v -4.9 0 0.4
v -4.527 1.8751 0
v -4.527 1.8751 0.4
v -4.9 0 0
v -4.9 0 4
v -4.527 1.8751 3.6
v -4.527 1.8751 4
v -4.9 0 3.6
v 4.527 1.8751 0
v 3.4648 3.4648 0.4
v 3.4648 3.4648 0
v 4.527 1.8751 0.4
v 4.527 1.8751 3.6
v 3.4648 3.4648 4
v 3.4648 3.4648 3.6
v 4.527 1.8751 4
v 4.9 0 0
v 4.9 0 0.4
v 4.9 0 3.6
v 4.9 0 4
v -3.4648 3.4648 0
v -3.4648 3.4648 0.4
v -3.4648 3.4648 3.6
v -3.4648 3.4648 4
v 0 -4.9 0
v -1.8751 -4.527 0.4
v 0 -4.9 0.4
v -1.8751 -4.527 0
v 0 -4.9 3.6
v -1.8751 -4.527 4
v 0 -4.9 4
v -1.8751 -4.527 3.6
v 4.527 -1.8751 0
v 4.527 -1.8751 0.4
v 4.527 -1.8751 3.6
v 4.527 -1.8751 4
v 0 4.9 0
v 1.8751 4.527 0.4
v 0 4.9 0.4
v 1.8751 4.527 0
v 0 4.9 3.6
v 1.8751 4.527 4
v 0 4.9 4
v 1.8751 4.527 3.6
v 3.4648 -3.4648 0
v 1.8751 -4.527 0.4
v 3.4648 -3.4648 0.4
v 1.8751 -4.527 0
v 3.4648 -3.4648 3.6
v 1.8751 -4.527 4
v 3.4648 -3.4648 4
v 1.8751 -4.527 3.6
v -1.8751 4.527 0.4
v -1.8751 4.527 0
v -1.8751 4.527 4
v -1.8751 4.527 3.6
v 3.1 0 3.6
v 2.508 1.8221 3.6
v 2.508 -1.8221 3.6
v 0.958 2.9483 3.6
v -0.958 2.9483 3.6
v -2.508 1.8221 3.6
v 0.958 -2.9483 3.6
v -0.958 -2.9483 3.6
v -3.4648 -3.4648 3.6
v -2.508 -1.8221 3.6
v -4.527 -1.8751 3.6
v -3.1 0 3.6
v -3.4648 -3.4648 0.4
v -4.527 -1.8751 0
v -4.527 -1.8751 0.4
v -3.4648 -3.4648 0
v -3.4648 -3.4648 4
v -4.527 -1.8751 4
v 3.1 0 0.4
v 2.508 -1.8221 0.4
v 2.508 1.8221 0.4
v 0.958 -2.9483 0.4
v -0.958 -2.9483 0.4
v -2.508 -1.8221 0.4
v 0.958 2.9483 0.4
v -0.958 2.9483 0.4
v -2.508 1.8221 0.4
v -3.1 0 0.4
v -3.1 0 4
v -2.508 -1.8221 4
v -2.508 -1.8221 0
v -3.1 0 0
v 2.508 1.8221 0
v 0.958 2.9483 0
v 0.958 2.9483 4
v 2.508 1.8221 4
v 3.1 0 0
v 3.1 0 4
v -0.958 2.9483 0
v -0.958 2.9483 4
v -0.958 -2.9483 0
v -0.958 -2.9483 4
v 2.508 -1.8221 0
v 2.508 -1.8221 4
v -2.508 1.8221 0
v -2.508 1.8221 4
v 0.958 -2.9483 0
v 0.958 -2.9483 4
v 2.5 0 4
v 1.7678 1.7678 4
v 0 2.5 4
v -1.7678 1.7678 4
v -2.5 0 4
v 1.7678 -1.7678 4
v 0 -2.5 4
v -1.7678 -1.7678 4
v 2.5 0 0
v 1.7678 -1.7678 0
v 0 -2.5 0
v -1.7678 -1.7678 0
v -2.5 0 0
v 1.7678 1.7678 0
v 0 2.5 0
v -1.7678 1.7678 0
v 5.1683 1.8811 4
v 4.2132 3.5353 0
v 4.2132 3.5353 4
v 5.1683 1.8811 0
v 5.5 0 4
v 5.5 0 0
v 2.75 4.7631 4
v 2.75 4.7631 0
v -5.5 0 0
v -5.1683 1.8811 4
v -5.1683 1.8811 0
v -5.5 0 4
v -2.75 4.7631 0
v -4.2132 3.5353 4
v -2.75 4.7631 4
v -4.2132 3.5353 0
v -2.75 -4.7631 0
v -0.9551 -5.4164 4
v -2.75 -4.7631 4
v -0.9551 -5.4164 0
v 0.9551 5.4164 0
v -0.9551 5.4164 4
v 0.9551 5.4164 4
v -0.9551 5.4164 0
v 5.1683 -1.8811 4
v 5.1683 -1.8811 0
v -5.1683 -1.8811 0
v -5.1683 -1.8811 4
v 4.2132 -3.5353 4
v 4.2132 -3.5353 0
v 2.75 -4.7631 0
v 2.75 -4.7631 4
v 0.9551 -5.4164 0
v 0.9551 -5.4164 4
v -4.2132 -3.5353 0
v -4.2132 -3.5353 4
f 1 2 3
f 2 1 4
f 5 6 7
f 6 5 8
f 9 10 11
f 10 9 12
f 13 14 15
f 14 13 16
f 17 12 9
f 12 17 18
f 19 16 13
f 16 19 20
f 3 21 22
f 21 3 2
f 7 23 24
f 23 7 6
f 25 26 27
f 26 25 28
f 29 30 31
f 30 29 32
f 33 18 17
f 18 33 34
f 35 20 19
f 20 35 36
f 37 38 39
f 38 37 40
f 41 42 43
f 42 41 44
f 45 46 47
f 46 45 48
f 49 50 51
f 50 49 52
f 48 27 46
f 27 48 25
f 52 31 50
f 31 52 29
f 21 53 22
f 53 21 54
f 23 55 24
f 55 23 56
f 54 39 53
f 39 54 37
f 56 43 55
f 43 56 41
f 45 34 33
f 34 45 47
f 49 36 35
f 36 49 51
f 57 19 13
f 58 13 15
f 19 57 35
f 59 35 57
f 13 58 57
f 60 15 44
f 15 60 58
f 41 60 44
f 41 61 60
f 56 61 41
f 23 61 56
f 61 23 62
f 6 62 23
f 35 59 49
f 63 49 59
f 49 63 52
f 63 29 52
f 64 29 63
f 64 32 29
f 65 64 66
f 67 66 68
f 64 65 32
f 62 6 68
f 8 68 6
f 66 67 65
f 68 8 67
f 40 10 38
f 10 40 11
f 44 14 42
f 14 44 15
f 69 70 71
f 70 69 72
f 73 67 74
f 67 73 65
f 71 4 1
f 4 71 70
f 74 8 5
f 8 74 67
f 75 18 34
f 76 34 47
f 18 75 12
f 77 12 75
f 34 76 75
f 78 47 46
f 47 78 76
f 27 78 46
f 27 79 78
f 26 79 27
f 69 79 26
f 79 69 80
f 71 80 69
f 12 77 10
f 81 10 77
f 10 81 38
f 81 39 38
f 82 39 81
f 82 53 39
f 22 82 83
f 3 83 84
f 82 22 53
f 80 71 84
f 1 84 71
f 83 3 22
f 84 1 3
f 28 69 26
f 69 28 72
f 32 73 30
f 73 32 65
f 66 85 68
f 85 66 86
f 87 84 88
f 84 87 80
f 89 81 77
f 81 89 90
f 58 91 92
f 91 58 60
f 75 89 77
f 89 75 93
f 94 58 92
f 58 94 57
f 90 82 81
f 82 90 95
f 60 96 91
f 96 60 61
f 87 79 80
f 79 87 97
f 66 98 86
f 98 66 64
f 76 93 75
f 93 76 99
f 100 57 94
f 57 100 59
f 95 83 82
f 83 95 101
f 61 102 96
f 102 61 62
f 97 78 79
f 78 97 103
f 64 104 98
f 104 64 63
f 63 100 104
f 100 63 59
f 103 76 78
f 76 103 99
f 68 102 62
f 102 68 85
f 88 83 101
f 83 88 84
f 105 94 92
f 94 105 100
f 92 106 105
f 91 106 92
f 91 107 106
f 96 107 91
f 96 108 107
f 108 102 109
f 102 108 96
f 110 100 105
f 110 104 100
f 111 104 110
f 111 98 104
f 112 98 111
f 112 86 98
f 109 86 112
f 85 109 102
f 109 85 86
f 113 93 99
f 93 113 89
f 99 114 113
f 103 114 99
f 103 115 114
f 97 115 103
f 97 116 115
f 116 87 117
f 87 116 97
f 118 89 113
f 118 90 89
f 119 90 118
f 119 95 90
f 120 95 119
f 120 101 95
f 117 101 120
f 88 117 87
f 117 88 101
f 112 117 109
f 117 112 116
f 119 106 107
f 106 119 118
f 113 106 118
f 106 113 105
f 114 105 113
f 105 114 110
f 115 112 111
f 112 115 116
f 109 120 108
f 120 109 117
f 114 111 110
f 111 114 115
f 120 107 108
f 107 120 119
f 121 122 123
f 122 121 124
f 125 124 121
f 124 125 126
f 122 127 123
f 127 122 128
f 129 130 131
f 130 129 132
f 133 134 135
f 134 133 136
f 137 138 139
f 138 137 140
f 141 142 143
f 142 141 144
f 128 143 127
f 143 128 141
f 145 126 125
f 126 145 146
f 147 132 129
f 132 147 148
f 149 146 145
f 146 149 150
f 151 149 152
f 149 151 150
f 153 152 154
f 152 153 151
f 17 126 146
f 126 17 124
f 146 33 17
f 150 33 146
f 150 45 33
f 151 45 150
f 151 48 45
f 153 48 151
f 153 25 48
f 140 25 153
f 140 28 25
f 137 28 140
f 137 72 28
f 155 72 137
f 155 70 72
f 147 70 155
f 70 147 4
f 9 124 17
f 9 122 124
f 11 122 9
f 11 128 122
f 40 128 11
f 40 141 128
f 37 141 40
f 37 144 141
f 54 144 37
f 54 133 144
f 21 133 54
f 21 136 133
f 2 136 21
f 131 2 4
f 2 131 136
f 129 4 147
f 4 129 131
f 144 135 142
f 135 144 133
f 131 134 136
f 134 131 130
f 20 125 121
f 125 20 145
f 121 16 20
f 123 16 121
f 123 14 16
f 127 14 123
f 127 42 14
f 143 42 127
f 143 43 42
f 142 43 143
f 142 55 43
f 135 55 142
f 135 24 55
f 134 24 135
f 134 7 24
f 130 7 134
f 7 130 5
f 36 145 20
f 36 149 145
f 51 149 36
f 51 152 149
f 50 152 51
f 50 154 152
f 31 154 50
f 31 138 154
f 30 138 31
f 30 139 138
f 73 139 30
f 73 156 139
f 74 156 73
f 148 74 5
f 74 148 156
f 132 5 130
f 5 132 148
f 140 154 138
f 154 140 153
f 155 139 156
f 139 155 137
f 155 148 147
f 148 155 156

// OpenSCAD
use <./bcad.scad>


//////////////////////////////////////////////////////////////////////
// Flange Bearings.
//////////////////////////////////////////////////////////////////////
function get_lmkuu_width(size) = lookup(size, [ //K
        [  6.0,   22],
        [  8.1,   25], //the s version
        [  8.0,   25],
        [ 10.0,   30],
        [ 12.0,   32],
        [ 13.0,   34],
        [ 16.0,   37],
        [ 20.0,   42],
        [ 25.0,   50],
        [ 30.0,   58],
        [ 35.0,   64]
]);

function get_lmkuu_dim(size) = lookup(size, [ //D
        [  6.0,   12],
        [  8.1,   15], //S
        [  8.0,   15],
        [ 10.0,   19],
        [ 12.0,   21],
        [ 13.0,   23],
        [ 16.0,   28],
        [ 20.0,   32],
        [ 25.0,   40],
        [ 30.0,   45],
        [ 35.0,   52]
]);

function get_lmkuu_len(size) = lookup(size, [ //L
        [  6.0,   19],
        [  8.1,   17],//S
        [  8.0,   24],
        [ 10.0,   29],
        [ 12.0,   30],
        [ 13.0,   32],
        [ 16.0,   37],
        [ 20.0,   42],
        [ 25.0,   59],
        [ 30.0,   64],
        [ 35.0,   70]

]);

function get_lmkuu_pcd(size) = lookup(size, [ //P.C.D
        [  6.0,   20],
        [  8.1,   24],//S
        [  8.0,   24],
        [ 10.0,   29],
        [ 12.0,   32],
        [ 13.0,   33],
        [ 16.0,   38],
        [ 20.0,   43],
        [ 25.0,   51],
        [ 30.0,   60],
        [ 35.0,   97]
]);

function get_lmkuu_d1(size) = lookup(size, [ //D1
        [  6.0,   3.5],
        [  8.1,   3.5],//S
        [  8.0,   3.5],
        [ 10.0,   4.5],
        [ 12.0,   4.5],
        [ 13.0,   4.5],
        [ 16.0,   4.5],
        [ 20.0,   5.5],
        [ 25.0,   5.5],
        [ 30.0,   6.6],
        [ 35.0,   6.6]
]);

module LMKXUU(size=10) {
    w = get_lmkuu_width(size);

    difference() {
        union() {
            move(x=-w/2,y=-w/2)
                cube([w,w,6]);
            cylinder(d=get_lmkuu_dim(size),h=get_lmkuu_len(size));
        }
        down(1) {
            zring(n=4)
                zrot(-45)
                move(x=get_lmkuu_pcd(size)/2)
                cylinder(d=get_lmkuu_d1(size),h=50);

            cylinder(d=size,h=50);
        }
    }
}

//////////////////////////////////////////////////////////////////////
// Round Bearings.
//////////////////////////////////////////////////////////////////////
function get_bearing_inner_diam(size) = lookup(size, [
        [ 115.0,   5.0],//MR115
        [ 188.0,   6.3],
        [ 608.0,   8.0],
        [ 623.0,   3.0],
        [ 624.0,   4.0],
        [ 626.0,   6.0],
        [ 627.0,   7.0],
        [ 688.0,   8.0],
        [ 698.0,   8.0]
]);

function get_bearing_outer_diam(size) = lookup(size, [
        [ 115.0,  11.0],//MR115
        [ 188.0,  13.5],
        [ 608.0,  22.0],
        [ 623.0,  10.0],
        [ 624.0,  13.0],
        [ 626.0,  19.0],
        [ 627.0,  22.0],
        [ 688.0,  16.0],
        [ 698.0,  19.0]
    ]);

function get_bearing_height(size) = lookup(size, [
        [ 115.0,   4.0],//MR115
        [ 188.0,   5.0],
        [ 608.0,   7.0],
        [ 623.0,   4.0],
        [ 624.0,   5.0],
        [ 626.0,   6.0],
        [ 627.0,   7.0],
        [ 688.0,   4.0],
        [ 698.0,   6.0]
    ]);




module _bearRing(od, id, h, material, holeMaterial) {
    difference() {
        cylinder(d=od,h=h);
        translate([0,0,-1])
            cylinder(d=id,h=h+2);
    }
}

module bearing(size = 626, outline, center=false) {
    innerD = get_bearing_inner_diam(size);
    outerD = get_bearing_outer_diam(size);
    h = get_bearing_height(size);

    translate(center ? [0,0,-h/2] : [0,0,0]) {
        if(outline) {
            innerRim = innerD + (outerD - innerD) * 0.2;
            outerRim = outerD - (outerD - innerD) * 0.2;
            midSink = h * 0.1;
            translate([0,0,midSink])
                _bearRing(outerRim,innerRim,h-midSink*2);
            color([0.65, 0.67, 0.72])
                _bearRing(innerRim, innerD, h);
            color([0.65, 0.67, 0.72])
                _bearRing(outerD, outerRim, h);
        } else {
            color([0.65, 0.67, 0.72])
                _bearRing(outerD, innerD, h);
        }
    }
}

bearing(size=115,outline=true);






//////////////////////////////////////////////////////////////////////
// Linear Bearings.
//////////////////////////////////////////////////////////////////////
function get_lmXuu_bearing_diam(size) = lookup(size, [
        [  4.0,   8.0],
        [  5.0,  10.0],
        [  6.0,  12.0],
        [  8.0,  15.0],
        [ 10.0,  19.0],
        [ 12.0,  21.0],
        [ 13.0,  23.0],
        [ 16.0,  28.0],
        [ 20.0,  32.0],
        [ 25.0,  40.0],
        [ 30.0,  45.0],
        [ 35.0,  52.0],
        [ 40.0,  60.0],
        [ 50.0,  80.0],
        [ 60.0,  90.0],
        [ 80.0, 120.0],
        [100.0, 150.0]
    ]);

function get_lmXuu_bearing_length(size) = lookup(size, [
        [  4.0,  12.0],
        [  5.0,  15.0],
        [  6.0,  19.0],
        [  8.0,  24.0],
        [ 10.0,  29.0],
        [ 12.0,  30.0],
        [ 13.0,  32.0],
        [ 16.0,  37.0],
        [ 20.0,  42.0],
        [ 25.0,  59.0],
        [ 30.0,  64.0],
        [ 35.0,  70.0],
        [ 40.0,  80.0],
        [ 50.0, 100.0],
        [ 60.0, 110.0],
        [ 80.0, 140.0],
        [100.0, 175.0]
    ]);


// Creates a model of a clamp to hold a given linear bearing cartridge.
//   d = Diameter of linear bearing. (Default: 15)
//   l = Length of linear bearing. (Default: 24)
//   tab = Clamp tab height. (Default: 7)
//   tabwall = Clamp Tab thickness. (Default: 5)
//   wall = Wall thickness of clamp housing. (Default: 3)
//   gap = Gap in clamp. (Default: 5)
//   screwsize = Size of screw to use to tighten clamp. (Default: 3)
module linear_bearing_housing(d=15,l=24,tab=7,gap=5,wall=3,tabwall=5,screwsize=3,clearance=0)
{
    od = d+2*wall;
    ogap = gap+2*tabwall;
    tabh = tab/2+od/2*sqrt(2)-ogap/2;
    translate([0,0,od/2]) difference() {
        union() {
            rotate([0,0,90])
                teardrop(r=od/2,h=l);
            translate([0,0,tabh])
                cube(size=[l,ogap,tab+0.05], center=true);
            translate([0,0,-od/4])
                cube(size=[l,od,od/2], center=true);
        }
        rotate([0,0,90])
            teardrop(r=d/2+clearance,h=l+0.05);
        translate([0,0,(d*sqrt(2)+tab)/2])
            cube(size=[l+0.05,gap,d+tab], center=true);
        translate([0,0,tabh]) {
            translate([0,-ogap/2+2-0.05,0])
                rotate([90,0,0])
                    screw(screwsize=screwsize*1.06, screwlen=ogap, headsize=screwsize*2, headlen=10);
            translate([0,ogap/2+0.05,0])
                rotate([90,0,0])
                    metric_nut(size=screwsize,hole=false);
        }
    }
}


module lmXuu_housing(size=8,tab=7,gap=5,wall=3,tabwall=5,screwsize=3,clearance=0)
{
    d = get_lmXuu_bearing_diam(size);
    l = get_lmXuu_bearing_length(size);
    linear_bearing_housing(d=d,l=l,tab=tab,gap=gap,wall=wall,tabwall=tabwall,screwsize=screwsize,clearance=clearance);
}


module lmXuu_zip(
    size = 6,
    length,
    wall = 3,
    clearance = 0,
    zipWidth = 3.5,
    zipHeight = 1.5,
    zipOffset = 2,
    zipCnt = 2
){
    linearBearingHolderZip(size=size,length=length,wall=wall,
        clearance=clearance,zipWidth=zipWidth,zipHeight=zipHeight,
        zipOffset = zipOffset, zipCnt=zipCnt);
}




//--Linear bearing
module groove(d1, d2, w) {
    difference() {
        cylinder(r=d1/2+1, h=w, center=true);
        cylinder(r=d2/2  , h=w, center=true);
    }
}

module lb(D_Int=8, D_Ext=15, D_1=14.3, L=24, W=1.1, B=17.5) {
chamf = D_Ext - D_1;
    difference() {
        hull() {
            cylinder(r=D_Ext/2, h=L-chamf, center=true);
            cylinder(r=D_1  /2, h=L      , center=true);
        }
        cylinder(r=D_Int/2, h=L+2    , center=true);
        translate([0, 0, B/2-W/2]) groove(D_Ext, D_1, W);
        translate([0, 0,-B/2+W/2]) groove(D_Ext, D_1, W);
        translate([0, 0,     L/2]) groove(D_Ext-(D_Ext-D_Int)/2, 1, W);
        translate([0, 0,    -L/2]) groove(D_Ext-(D_Ext-D_Int)/2, 1, W);
    }
}



module LM8UU() {
    lb(D_Int=8, D_Ext=15, D_1=14.3, L=24, W=1.1, B=17.5);
}

module LMXUU(size) {
    diam = get_lmXuu_bearing_diam(size);
    leng = get_lmXuu_bearing_length(size);
    lb(D_Int=size, D_Ext=diam, D_1=diam-0.7, L=leng, W=1.1, B=leng-6.5);
}




//linearBearingHolderZip(zipCnt=1);

module linearBearingHolderZipCut(
    size = 6,
    wall = 3,
    zipWidth = 3.5,
    zipHeight = 1.5,
    zipOffset = 2,
) {
    bearingD = get_lmXuu_bearing_diam(size);
    bearingR = bearingD / 2;

    up((bearingR+wall)/2)
        yrot(90)
        right(zipOffset) {
            difference () {
                cylinder(r=bearingR + wall, h=zipWidth,center=true);
                cylinder(r=bearingR + wall - zipHeight, h=zipWidth+1,center=true);
            }
            yflip_copy()
                move(y=bearingR+wall-zipHeight/2+0.5)
                    cube([wall*2,zipHeight+1,zipWidth], center=true);
        }
}

module linearBearingHolderZip(
    size = 6,
    length,
    wall = 3,
    clearance = 0,
    zipWidth = 3.5,
    zipHeight = 1.5,
    zipOffset = 2,
    zipCnt = 2
) {
    bearingD = get_lmXuu_bearing_diam(size);
    bearingR = bearingD / 2;
    bearingLen = (length==undef)?get_lmXuu_bearing_length(size):length;

    h = bearingD/2 + wall;

    up(h/2)
    difference() {
        cube([bearingLen, bearingD + wall*2, h],center=true);
        //Bearing
        up((bearingR+wall)/2)
            yrot(90)
                cylinder(d=bearingD+clearance,h=bearingLen+10, center=true);


        //Zips
        xspread(bearingLen/zipCnt,n=zipCnt)
            linearBearingHolderZipCut(size=size, wall=wall,
                zipOffset=zipOffset,zipWidth=zipWidth,zipHeight=zipHeight);
    }
}

module linearBearingHolder(bearing=8, screw=3, wall=3, nutWall=2, clearance=0.5, useNut=1, nutCount=1,length) {
    // main body dimensions
    bearingRodD = bearing;
    bearingD = get_lmXuu_bearing_diam(bearing); //LM8UU
    bearingLen = (length==undef)?get_lmXuu_bearing_length(bearing):length;
    //Screw nut M3
    screwThreadDiaISO = 3;
    screwHeadDiaISO = 5.5;
    nutWrenchSizeISO = 5.5;

    //Calc all we need
    bodyWidth = bearingD + (2*wall);
    bodyHeight = bodyWidth;
    bodyLen = bearingLen;

    screwBushingSpace = 1;
    screwThreadDia = screwThreadDiaISO + clearance;
    screwElevation = bearingD + wall + (screwThreadDia/2) +screwBushingSpace;
    screwHeadD = screwHeadDiaISO + clearance;
    nutWrenchSize = nutWrenchSizeISO + clearance;

    gapWidth = bearingRodD +2;

    nutSpacing = bodyLen / nutCount;

    difference() {
        union() {
            //Body
            up(bodyHeight/4)
                cube([bodyWidth,bodyLen,bodyHeight/2], center=true);
            up((bearingD/2) +wall)
                xrot(90)
                    cylinder(r=(bearingD/2)+wall, h=bearingLen, center=true);

            if(useNut) {
                //Gap support
                xflip_copy()
                    move(x=-(gapWidth/2)-wall,y=-(bodyLen/2), z=bodyHeight/2)
                        cube([wall, bearingLen, (bearingD/2)+screwBushingSpace+screwThreadDia/2]);

                yspread(spacing=nutSpacing, n=nutCount) {
                // Screw hole surround
                xflip_copy()
                move(x=-gapWidth/2,z=screwElevation)
                    yrot(-90)
                        cylinder(r=(screwHeadD/2)+nutWall,h=(bodyWidth-gapWidth)/2, $fn=20);

                //Nut and screw support
                xflip_copy()
                    move(x=gapWidth/2+(bodyWidth-gapWidth)/4, z=screwElevation/2)
                        cube([(bodyWidth-gapWidth)/2, nutWrenchSize+nutWall*2,screwElevation],center=true);
                }
            }
        }

        //bushing hole
        up(bearingD/2+wall)
            xrot(90)
                cylinder(r=bearingD/2, h=bearingLen+1,center=true);

        //top gap
        move(x=-gapWidth/2,y=-bodyLen/2-1,z=bodyHeight/2)
            cube([gapWidth,bodyLen+2,bodyHeight]);

        if(useNut) {
            //screw hole
            yspread(spacing=nutSpacing, n=nutCount) {
                up(screwElevation)
                    yrot(90)
                        cylinder(r=screwThreadDia/2,h=bodyWidth+2, center=true);
                //nut trap
                move(x=gapWidth/2+wall, z=screwElevation)
                    yrot(90)
                        cylinder(r=nutWrenchSize/2, h=bodyWidth/2-gapWidth/2-wall+1,$fn=6);

                //Screw head hole
                move(x=-gapWidth/2-wall, z=screwElevation)
                    yrot(-90)
                        cylinder(r=screwHeadD/2,h=bodyWidth/2-gapWidth/2-wall+1);
            }
        }
    }
}


module LMXUUClamp(
    size = 8,
    thickness = 2.4,
    clearance = 0,
    gap = 3,
    length)
{
    diam  = get_lmXuu_bearing_diam(size);
    h = (length==undef)?get_lmXuu_bearing_length(size):length;

    difference() {
        cylinder(d=diam+thickness*2,h=h);
        down(1) {
            cylinder(d=diam+clearance, h=h+2);
            move(y=-gap/2)
                cube([diam+20,gap,h+2]);
        }
    }
}
